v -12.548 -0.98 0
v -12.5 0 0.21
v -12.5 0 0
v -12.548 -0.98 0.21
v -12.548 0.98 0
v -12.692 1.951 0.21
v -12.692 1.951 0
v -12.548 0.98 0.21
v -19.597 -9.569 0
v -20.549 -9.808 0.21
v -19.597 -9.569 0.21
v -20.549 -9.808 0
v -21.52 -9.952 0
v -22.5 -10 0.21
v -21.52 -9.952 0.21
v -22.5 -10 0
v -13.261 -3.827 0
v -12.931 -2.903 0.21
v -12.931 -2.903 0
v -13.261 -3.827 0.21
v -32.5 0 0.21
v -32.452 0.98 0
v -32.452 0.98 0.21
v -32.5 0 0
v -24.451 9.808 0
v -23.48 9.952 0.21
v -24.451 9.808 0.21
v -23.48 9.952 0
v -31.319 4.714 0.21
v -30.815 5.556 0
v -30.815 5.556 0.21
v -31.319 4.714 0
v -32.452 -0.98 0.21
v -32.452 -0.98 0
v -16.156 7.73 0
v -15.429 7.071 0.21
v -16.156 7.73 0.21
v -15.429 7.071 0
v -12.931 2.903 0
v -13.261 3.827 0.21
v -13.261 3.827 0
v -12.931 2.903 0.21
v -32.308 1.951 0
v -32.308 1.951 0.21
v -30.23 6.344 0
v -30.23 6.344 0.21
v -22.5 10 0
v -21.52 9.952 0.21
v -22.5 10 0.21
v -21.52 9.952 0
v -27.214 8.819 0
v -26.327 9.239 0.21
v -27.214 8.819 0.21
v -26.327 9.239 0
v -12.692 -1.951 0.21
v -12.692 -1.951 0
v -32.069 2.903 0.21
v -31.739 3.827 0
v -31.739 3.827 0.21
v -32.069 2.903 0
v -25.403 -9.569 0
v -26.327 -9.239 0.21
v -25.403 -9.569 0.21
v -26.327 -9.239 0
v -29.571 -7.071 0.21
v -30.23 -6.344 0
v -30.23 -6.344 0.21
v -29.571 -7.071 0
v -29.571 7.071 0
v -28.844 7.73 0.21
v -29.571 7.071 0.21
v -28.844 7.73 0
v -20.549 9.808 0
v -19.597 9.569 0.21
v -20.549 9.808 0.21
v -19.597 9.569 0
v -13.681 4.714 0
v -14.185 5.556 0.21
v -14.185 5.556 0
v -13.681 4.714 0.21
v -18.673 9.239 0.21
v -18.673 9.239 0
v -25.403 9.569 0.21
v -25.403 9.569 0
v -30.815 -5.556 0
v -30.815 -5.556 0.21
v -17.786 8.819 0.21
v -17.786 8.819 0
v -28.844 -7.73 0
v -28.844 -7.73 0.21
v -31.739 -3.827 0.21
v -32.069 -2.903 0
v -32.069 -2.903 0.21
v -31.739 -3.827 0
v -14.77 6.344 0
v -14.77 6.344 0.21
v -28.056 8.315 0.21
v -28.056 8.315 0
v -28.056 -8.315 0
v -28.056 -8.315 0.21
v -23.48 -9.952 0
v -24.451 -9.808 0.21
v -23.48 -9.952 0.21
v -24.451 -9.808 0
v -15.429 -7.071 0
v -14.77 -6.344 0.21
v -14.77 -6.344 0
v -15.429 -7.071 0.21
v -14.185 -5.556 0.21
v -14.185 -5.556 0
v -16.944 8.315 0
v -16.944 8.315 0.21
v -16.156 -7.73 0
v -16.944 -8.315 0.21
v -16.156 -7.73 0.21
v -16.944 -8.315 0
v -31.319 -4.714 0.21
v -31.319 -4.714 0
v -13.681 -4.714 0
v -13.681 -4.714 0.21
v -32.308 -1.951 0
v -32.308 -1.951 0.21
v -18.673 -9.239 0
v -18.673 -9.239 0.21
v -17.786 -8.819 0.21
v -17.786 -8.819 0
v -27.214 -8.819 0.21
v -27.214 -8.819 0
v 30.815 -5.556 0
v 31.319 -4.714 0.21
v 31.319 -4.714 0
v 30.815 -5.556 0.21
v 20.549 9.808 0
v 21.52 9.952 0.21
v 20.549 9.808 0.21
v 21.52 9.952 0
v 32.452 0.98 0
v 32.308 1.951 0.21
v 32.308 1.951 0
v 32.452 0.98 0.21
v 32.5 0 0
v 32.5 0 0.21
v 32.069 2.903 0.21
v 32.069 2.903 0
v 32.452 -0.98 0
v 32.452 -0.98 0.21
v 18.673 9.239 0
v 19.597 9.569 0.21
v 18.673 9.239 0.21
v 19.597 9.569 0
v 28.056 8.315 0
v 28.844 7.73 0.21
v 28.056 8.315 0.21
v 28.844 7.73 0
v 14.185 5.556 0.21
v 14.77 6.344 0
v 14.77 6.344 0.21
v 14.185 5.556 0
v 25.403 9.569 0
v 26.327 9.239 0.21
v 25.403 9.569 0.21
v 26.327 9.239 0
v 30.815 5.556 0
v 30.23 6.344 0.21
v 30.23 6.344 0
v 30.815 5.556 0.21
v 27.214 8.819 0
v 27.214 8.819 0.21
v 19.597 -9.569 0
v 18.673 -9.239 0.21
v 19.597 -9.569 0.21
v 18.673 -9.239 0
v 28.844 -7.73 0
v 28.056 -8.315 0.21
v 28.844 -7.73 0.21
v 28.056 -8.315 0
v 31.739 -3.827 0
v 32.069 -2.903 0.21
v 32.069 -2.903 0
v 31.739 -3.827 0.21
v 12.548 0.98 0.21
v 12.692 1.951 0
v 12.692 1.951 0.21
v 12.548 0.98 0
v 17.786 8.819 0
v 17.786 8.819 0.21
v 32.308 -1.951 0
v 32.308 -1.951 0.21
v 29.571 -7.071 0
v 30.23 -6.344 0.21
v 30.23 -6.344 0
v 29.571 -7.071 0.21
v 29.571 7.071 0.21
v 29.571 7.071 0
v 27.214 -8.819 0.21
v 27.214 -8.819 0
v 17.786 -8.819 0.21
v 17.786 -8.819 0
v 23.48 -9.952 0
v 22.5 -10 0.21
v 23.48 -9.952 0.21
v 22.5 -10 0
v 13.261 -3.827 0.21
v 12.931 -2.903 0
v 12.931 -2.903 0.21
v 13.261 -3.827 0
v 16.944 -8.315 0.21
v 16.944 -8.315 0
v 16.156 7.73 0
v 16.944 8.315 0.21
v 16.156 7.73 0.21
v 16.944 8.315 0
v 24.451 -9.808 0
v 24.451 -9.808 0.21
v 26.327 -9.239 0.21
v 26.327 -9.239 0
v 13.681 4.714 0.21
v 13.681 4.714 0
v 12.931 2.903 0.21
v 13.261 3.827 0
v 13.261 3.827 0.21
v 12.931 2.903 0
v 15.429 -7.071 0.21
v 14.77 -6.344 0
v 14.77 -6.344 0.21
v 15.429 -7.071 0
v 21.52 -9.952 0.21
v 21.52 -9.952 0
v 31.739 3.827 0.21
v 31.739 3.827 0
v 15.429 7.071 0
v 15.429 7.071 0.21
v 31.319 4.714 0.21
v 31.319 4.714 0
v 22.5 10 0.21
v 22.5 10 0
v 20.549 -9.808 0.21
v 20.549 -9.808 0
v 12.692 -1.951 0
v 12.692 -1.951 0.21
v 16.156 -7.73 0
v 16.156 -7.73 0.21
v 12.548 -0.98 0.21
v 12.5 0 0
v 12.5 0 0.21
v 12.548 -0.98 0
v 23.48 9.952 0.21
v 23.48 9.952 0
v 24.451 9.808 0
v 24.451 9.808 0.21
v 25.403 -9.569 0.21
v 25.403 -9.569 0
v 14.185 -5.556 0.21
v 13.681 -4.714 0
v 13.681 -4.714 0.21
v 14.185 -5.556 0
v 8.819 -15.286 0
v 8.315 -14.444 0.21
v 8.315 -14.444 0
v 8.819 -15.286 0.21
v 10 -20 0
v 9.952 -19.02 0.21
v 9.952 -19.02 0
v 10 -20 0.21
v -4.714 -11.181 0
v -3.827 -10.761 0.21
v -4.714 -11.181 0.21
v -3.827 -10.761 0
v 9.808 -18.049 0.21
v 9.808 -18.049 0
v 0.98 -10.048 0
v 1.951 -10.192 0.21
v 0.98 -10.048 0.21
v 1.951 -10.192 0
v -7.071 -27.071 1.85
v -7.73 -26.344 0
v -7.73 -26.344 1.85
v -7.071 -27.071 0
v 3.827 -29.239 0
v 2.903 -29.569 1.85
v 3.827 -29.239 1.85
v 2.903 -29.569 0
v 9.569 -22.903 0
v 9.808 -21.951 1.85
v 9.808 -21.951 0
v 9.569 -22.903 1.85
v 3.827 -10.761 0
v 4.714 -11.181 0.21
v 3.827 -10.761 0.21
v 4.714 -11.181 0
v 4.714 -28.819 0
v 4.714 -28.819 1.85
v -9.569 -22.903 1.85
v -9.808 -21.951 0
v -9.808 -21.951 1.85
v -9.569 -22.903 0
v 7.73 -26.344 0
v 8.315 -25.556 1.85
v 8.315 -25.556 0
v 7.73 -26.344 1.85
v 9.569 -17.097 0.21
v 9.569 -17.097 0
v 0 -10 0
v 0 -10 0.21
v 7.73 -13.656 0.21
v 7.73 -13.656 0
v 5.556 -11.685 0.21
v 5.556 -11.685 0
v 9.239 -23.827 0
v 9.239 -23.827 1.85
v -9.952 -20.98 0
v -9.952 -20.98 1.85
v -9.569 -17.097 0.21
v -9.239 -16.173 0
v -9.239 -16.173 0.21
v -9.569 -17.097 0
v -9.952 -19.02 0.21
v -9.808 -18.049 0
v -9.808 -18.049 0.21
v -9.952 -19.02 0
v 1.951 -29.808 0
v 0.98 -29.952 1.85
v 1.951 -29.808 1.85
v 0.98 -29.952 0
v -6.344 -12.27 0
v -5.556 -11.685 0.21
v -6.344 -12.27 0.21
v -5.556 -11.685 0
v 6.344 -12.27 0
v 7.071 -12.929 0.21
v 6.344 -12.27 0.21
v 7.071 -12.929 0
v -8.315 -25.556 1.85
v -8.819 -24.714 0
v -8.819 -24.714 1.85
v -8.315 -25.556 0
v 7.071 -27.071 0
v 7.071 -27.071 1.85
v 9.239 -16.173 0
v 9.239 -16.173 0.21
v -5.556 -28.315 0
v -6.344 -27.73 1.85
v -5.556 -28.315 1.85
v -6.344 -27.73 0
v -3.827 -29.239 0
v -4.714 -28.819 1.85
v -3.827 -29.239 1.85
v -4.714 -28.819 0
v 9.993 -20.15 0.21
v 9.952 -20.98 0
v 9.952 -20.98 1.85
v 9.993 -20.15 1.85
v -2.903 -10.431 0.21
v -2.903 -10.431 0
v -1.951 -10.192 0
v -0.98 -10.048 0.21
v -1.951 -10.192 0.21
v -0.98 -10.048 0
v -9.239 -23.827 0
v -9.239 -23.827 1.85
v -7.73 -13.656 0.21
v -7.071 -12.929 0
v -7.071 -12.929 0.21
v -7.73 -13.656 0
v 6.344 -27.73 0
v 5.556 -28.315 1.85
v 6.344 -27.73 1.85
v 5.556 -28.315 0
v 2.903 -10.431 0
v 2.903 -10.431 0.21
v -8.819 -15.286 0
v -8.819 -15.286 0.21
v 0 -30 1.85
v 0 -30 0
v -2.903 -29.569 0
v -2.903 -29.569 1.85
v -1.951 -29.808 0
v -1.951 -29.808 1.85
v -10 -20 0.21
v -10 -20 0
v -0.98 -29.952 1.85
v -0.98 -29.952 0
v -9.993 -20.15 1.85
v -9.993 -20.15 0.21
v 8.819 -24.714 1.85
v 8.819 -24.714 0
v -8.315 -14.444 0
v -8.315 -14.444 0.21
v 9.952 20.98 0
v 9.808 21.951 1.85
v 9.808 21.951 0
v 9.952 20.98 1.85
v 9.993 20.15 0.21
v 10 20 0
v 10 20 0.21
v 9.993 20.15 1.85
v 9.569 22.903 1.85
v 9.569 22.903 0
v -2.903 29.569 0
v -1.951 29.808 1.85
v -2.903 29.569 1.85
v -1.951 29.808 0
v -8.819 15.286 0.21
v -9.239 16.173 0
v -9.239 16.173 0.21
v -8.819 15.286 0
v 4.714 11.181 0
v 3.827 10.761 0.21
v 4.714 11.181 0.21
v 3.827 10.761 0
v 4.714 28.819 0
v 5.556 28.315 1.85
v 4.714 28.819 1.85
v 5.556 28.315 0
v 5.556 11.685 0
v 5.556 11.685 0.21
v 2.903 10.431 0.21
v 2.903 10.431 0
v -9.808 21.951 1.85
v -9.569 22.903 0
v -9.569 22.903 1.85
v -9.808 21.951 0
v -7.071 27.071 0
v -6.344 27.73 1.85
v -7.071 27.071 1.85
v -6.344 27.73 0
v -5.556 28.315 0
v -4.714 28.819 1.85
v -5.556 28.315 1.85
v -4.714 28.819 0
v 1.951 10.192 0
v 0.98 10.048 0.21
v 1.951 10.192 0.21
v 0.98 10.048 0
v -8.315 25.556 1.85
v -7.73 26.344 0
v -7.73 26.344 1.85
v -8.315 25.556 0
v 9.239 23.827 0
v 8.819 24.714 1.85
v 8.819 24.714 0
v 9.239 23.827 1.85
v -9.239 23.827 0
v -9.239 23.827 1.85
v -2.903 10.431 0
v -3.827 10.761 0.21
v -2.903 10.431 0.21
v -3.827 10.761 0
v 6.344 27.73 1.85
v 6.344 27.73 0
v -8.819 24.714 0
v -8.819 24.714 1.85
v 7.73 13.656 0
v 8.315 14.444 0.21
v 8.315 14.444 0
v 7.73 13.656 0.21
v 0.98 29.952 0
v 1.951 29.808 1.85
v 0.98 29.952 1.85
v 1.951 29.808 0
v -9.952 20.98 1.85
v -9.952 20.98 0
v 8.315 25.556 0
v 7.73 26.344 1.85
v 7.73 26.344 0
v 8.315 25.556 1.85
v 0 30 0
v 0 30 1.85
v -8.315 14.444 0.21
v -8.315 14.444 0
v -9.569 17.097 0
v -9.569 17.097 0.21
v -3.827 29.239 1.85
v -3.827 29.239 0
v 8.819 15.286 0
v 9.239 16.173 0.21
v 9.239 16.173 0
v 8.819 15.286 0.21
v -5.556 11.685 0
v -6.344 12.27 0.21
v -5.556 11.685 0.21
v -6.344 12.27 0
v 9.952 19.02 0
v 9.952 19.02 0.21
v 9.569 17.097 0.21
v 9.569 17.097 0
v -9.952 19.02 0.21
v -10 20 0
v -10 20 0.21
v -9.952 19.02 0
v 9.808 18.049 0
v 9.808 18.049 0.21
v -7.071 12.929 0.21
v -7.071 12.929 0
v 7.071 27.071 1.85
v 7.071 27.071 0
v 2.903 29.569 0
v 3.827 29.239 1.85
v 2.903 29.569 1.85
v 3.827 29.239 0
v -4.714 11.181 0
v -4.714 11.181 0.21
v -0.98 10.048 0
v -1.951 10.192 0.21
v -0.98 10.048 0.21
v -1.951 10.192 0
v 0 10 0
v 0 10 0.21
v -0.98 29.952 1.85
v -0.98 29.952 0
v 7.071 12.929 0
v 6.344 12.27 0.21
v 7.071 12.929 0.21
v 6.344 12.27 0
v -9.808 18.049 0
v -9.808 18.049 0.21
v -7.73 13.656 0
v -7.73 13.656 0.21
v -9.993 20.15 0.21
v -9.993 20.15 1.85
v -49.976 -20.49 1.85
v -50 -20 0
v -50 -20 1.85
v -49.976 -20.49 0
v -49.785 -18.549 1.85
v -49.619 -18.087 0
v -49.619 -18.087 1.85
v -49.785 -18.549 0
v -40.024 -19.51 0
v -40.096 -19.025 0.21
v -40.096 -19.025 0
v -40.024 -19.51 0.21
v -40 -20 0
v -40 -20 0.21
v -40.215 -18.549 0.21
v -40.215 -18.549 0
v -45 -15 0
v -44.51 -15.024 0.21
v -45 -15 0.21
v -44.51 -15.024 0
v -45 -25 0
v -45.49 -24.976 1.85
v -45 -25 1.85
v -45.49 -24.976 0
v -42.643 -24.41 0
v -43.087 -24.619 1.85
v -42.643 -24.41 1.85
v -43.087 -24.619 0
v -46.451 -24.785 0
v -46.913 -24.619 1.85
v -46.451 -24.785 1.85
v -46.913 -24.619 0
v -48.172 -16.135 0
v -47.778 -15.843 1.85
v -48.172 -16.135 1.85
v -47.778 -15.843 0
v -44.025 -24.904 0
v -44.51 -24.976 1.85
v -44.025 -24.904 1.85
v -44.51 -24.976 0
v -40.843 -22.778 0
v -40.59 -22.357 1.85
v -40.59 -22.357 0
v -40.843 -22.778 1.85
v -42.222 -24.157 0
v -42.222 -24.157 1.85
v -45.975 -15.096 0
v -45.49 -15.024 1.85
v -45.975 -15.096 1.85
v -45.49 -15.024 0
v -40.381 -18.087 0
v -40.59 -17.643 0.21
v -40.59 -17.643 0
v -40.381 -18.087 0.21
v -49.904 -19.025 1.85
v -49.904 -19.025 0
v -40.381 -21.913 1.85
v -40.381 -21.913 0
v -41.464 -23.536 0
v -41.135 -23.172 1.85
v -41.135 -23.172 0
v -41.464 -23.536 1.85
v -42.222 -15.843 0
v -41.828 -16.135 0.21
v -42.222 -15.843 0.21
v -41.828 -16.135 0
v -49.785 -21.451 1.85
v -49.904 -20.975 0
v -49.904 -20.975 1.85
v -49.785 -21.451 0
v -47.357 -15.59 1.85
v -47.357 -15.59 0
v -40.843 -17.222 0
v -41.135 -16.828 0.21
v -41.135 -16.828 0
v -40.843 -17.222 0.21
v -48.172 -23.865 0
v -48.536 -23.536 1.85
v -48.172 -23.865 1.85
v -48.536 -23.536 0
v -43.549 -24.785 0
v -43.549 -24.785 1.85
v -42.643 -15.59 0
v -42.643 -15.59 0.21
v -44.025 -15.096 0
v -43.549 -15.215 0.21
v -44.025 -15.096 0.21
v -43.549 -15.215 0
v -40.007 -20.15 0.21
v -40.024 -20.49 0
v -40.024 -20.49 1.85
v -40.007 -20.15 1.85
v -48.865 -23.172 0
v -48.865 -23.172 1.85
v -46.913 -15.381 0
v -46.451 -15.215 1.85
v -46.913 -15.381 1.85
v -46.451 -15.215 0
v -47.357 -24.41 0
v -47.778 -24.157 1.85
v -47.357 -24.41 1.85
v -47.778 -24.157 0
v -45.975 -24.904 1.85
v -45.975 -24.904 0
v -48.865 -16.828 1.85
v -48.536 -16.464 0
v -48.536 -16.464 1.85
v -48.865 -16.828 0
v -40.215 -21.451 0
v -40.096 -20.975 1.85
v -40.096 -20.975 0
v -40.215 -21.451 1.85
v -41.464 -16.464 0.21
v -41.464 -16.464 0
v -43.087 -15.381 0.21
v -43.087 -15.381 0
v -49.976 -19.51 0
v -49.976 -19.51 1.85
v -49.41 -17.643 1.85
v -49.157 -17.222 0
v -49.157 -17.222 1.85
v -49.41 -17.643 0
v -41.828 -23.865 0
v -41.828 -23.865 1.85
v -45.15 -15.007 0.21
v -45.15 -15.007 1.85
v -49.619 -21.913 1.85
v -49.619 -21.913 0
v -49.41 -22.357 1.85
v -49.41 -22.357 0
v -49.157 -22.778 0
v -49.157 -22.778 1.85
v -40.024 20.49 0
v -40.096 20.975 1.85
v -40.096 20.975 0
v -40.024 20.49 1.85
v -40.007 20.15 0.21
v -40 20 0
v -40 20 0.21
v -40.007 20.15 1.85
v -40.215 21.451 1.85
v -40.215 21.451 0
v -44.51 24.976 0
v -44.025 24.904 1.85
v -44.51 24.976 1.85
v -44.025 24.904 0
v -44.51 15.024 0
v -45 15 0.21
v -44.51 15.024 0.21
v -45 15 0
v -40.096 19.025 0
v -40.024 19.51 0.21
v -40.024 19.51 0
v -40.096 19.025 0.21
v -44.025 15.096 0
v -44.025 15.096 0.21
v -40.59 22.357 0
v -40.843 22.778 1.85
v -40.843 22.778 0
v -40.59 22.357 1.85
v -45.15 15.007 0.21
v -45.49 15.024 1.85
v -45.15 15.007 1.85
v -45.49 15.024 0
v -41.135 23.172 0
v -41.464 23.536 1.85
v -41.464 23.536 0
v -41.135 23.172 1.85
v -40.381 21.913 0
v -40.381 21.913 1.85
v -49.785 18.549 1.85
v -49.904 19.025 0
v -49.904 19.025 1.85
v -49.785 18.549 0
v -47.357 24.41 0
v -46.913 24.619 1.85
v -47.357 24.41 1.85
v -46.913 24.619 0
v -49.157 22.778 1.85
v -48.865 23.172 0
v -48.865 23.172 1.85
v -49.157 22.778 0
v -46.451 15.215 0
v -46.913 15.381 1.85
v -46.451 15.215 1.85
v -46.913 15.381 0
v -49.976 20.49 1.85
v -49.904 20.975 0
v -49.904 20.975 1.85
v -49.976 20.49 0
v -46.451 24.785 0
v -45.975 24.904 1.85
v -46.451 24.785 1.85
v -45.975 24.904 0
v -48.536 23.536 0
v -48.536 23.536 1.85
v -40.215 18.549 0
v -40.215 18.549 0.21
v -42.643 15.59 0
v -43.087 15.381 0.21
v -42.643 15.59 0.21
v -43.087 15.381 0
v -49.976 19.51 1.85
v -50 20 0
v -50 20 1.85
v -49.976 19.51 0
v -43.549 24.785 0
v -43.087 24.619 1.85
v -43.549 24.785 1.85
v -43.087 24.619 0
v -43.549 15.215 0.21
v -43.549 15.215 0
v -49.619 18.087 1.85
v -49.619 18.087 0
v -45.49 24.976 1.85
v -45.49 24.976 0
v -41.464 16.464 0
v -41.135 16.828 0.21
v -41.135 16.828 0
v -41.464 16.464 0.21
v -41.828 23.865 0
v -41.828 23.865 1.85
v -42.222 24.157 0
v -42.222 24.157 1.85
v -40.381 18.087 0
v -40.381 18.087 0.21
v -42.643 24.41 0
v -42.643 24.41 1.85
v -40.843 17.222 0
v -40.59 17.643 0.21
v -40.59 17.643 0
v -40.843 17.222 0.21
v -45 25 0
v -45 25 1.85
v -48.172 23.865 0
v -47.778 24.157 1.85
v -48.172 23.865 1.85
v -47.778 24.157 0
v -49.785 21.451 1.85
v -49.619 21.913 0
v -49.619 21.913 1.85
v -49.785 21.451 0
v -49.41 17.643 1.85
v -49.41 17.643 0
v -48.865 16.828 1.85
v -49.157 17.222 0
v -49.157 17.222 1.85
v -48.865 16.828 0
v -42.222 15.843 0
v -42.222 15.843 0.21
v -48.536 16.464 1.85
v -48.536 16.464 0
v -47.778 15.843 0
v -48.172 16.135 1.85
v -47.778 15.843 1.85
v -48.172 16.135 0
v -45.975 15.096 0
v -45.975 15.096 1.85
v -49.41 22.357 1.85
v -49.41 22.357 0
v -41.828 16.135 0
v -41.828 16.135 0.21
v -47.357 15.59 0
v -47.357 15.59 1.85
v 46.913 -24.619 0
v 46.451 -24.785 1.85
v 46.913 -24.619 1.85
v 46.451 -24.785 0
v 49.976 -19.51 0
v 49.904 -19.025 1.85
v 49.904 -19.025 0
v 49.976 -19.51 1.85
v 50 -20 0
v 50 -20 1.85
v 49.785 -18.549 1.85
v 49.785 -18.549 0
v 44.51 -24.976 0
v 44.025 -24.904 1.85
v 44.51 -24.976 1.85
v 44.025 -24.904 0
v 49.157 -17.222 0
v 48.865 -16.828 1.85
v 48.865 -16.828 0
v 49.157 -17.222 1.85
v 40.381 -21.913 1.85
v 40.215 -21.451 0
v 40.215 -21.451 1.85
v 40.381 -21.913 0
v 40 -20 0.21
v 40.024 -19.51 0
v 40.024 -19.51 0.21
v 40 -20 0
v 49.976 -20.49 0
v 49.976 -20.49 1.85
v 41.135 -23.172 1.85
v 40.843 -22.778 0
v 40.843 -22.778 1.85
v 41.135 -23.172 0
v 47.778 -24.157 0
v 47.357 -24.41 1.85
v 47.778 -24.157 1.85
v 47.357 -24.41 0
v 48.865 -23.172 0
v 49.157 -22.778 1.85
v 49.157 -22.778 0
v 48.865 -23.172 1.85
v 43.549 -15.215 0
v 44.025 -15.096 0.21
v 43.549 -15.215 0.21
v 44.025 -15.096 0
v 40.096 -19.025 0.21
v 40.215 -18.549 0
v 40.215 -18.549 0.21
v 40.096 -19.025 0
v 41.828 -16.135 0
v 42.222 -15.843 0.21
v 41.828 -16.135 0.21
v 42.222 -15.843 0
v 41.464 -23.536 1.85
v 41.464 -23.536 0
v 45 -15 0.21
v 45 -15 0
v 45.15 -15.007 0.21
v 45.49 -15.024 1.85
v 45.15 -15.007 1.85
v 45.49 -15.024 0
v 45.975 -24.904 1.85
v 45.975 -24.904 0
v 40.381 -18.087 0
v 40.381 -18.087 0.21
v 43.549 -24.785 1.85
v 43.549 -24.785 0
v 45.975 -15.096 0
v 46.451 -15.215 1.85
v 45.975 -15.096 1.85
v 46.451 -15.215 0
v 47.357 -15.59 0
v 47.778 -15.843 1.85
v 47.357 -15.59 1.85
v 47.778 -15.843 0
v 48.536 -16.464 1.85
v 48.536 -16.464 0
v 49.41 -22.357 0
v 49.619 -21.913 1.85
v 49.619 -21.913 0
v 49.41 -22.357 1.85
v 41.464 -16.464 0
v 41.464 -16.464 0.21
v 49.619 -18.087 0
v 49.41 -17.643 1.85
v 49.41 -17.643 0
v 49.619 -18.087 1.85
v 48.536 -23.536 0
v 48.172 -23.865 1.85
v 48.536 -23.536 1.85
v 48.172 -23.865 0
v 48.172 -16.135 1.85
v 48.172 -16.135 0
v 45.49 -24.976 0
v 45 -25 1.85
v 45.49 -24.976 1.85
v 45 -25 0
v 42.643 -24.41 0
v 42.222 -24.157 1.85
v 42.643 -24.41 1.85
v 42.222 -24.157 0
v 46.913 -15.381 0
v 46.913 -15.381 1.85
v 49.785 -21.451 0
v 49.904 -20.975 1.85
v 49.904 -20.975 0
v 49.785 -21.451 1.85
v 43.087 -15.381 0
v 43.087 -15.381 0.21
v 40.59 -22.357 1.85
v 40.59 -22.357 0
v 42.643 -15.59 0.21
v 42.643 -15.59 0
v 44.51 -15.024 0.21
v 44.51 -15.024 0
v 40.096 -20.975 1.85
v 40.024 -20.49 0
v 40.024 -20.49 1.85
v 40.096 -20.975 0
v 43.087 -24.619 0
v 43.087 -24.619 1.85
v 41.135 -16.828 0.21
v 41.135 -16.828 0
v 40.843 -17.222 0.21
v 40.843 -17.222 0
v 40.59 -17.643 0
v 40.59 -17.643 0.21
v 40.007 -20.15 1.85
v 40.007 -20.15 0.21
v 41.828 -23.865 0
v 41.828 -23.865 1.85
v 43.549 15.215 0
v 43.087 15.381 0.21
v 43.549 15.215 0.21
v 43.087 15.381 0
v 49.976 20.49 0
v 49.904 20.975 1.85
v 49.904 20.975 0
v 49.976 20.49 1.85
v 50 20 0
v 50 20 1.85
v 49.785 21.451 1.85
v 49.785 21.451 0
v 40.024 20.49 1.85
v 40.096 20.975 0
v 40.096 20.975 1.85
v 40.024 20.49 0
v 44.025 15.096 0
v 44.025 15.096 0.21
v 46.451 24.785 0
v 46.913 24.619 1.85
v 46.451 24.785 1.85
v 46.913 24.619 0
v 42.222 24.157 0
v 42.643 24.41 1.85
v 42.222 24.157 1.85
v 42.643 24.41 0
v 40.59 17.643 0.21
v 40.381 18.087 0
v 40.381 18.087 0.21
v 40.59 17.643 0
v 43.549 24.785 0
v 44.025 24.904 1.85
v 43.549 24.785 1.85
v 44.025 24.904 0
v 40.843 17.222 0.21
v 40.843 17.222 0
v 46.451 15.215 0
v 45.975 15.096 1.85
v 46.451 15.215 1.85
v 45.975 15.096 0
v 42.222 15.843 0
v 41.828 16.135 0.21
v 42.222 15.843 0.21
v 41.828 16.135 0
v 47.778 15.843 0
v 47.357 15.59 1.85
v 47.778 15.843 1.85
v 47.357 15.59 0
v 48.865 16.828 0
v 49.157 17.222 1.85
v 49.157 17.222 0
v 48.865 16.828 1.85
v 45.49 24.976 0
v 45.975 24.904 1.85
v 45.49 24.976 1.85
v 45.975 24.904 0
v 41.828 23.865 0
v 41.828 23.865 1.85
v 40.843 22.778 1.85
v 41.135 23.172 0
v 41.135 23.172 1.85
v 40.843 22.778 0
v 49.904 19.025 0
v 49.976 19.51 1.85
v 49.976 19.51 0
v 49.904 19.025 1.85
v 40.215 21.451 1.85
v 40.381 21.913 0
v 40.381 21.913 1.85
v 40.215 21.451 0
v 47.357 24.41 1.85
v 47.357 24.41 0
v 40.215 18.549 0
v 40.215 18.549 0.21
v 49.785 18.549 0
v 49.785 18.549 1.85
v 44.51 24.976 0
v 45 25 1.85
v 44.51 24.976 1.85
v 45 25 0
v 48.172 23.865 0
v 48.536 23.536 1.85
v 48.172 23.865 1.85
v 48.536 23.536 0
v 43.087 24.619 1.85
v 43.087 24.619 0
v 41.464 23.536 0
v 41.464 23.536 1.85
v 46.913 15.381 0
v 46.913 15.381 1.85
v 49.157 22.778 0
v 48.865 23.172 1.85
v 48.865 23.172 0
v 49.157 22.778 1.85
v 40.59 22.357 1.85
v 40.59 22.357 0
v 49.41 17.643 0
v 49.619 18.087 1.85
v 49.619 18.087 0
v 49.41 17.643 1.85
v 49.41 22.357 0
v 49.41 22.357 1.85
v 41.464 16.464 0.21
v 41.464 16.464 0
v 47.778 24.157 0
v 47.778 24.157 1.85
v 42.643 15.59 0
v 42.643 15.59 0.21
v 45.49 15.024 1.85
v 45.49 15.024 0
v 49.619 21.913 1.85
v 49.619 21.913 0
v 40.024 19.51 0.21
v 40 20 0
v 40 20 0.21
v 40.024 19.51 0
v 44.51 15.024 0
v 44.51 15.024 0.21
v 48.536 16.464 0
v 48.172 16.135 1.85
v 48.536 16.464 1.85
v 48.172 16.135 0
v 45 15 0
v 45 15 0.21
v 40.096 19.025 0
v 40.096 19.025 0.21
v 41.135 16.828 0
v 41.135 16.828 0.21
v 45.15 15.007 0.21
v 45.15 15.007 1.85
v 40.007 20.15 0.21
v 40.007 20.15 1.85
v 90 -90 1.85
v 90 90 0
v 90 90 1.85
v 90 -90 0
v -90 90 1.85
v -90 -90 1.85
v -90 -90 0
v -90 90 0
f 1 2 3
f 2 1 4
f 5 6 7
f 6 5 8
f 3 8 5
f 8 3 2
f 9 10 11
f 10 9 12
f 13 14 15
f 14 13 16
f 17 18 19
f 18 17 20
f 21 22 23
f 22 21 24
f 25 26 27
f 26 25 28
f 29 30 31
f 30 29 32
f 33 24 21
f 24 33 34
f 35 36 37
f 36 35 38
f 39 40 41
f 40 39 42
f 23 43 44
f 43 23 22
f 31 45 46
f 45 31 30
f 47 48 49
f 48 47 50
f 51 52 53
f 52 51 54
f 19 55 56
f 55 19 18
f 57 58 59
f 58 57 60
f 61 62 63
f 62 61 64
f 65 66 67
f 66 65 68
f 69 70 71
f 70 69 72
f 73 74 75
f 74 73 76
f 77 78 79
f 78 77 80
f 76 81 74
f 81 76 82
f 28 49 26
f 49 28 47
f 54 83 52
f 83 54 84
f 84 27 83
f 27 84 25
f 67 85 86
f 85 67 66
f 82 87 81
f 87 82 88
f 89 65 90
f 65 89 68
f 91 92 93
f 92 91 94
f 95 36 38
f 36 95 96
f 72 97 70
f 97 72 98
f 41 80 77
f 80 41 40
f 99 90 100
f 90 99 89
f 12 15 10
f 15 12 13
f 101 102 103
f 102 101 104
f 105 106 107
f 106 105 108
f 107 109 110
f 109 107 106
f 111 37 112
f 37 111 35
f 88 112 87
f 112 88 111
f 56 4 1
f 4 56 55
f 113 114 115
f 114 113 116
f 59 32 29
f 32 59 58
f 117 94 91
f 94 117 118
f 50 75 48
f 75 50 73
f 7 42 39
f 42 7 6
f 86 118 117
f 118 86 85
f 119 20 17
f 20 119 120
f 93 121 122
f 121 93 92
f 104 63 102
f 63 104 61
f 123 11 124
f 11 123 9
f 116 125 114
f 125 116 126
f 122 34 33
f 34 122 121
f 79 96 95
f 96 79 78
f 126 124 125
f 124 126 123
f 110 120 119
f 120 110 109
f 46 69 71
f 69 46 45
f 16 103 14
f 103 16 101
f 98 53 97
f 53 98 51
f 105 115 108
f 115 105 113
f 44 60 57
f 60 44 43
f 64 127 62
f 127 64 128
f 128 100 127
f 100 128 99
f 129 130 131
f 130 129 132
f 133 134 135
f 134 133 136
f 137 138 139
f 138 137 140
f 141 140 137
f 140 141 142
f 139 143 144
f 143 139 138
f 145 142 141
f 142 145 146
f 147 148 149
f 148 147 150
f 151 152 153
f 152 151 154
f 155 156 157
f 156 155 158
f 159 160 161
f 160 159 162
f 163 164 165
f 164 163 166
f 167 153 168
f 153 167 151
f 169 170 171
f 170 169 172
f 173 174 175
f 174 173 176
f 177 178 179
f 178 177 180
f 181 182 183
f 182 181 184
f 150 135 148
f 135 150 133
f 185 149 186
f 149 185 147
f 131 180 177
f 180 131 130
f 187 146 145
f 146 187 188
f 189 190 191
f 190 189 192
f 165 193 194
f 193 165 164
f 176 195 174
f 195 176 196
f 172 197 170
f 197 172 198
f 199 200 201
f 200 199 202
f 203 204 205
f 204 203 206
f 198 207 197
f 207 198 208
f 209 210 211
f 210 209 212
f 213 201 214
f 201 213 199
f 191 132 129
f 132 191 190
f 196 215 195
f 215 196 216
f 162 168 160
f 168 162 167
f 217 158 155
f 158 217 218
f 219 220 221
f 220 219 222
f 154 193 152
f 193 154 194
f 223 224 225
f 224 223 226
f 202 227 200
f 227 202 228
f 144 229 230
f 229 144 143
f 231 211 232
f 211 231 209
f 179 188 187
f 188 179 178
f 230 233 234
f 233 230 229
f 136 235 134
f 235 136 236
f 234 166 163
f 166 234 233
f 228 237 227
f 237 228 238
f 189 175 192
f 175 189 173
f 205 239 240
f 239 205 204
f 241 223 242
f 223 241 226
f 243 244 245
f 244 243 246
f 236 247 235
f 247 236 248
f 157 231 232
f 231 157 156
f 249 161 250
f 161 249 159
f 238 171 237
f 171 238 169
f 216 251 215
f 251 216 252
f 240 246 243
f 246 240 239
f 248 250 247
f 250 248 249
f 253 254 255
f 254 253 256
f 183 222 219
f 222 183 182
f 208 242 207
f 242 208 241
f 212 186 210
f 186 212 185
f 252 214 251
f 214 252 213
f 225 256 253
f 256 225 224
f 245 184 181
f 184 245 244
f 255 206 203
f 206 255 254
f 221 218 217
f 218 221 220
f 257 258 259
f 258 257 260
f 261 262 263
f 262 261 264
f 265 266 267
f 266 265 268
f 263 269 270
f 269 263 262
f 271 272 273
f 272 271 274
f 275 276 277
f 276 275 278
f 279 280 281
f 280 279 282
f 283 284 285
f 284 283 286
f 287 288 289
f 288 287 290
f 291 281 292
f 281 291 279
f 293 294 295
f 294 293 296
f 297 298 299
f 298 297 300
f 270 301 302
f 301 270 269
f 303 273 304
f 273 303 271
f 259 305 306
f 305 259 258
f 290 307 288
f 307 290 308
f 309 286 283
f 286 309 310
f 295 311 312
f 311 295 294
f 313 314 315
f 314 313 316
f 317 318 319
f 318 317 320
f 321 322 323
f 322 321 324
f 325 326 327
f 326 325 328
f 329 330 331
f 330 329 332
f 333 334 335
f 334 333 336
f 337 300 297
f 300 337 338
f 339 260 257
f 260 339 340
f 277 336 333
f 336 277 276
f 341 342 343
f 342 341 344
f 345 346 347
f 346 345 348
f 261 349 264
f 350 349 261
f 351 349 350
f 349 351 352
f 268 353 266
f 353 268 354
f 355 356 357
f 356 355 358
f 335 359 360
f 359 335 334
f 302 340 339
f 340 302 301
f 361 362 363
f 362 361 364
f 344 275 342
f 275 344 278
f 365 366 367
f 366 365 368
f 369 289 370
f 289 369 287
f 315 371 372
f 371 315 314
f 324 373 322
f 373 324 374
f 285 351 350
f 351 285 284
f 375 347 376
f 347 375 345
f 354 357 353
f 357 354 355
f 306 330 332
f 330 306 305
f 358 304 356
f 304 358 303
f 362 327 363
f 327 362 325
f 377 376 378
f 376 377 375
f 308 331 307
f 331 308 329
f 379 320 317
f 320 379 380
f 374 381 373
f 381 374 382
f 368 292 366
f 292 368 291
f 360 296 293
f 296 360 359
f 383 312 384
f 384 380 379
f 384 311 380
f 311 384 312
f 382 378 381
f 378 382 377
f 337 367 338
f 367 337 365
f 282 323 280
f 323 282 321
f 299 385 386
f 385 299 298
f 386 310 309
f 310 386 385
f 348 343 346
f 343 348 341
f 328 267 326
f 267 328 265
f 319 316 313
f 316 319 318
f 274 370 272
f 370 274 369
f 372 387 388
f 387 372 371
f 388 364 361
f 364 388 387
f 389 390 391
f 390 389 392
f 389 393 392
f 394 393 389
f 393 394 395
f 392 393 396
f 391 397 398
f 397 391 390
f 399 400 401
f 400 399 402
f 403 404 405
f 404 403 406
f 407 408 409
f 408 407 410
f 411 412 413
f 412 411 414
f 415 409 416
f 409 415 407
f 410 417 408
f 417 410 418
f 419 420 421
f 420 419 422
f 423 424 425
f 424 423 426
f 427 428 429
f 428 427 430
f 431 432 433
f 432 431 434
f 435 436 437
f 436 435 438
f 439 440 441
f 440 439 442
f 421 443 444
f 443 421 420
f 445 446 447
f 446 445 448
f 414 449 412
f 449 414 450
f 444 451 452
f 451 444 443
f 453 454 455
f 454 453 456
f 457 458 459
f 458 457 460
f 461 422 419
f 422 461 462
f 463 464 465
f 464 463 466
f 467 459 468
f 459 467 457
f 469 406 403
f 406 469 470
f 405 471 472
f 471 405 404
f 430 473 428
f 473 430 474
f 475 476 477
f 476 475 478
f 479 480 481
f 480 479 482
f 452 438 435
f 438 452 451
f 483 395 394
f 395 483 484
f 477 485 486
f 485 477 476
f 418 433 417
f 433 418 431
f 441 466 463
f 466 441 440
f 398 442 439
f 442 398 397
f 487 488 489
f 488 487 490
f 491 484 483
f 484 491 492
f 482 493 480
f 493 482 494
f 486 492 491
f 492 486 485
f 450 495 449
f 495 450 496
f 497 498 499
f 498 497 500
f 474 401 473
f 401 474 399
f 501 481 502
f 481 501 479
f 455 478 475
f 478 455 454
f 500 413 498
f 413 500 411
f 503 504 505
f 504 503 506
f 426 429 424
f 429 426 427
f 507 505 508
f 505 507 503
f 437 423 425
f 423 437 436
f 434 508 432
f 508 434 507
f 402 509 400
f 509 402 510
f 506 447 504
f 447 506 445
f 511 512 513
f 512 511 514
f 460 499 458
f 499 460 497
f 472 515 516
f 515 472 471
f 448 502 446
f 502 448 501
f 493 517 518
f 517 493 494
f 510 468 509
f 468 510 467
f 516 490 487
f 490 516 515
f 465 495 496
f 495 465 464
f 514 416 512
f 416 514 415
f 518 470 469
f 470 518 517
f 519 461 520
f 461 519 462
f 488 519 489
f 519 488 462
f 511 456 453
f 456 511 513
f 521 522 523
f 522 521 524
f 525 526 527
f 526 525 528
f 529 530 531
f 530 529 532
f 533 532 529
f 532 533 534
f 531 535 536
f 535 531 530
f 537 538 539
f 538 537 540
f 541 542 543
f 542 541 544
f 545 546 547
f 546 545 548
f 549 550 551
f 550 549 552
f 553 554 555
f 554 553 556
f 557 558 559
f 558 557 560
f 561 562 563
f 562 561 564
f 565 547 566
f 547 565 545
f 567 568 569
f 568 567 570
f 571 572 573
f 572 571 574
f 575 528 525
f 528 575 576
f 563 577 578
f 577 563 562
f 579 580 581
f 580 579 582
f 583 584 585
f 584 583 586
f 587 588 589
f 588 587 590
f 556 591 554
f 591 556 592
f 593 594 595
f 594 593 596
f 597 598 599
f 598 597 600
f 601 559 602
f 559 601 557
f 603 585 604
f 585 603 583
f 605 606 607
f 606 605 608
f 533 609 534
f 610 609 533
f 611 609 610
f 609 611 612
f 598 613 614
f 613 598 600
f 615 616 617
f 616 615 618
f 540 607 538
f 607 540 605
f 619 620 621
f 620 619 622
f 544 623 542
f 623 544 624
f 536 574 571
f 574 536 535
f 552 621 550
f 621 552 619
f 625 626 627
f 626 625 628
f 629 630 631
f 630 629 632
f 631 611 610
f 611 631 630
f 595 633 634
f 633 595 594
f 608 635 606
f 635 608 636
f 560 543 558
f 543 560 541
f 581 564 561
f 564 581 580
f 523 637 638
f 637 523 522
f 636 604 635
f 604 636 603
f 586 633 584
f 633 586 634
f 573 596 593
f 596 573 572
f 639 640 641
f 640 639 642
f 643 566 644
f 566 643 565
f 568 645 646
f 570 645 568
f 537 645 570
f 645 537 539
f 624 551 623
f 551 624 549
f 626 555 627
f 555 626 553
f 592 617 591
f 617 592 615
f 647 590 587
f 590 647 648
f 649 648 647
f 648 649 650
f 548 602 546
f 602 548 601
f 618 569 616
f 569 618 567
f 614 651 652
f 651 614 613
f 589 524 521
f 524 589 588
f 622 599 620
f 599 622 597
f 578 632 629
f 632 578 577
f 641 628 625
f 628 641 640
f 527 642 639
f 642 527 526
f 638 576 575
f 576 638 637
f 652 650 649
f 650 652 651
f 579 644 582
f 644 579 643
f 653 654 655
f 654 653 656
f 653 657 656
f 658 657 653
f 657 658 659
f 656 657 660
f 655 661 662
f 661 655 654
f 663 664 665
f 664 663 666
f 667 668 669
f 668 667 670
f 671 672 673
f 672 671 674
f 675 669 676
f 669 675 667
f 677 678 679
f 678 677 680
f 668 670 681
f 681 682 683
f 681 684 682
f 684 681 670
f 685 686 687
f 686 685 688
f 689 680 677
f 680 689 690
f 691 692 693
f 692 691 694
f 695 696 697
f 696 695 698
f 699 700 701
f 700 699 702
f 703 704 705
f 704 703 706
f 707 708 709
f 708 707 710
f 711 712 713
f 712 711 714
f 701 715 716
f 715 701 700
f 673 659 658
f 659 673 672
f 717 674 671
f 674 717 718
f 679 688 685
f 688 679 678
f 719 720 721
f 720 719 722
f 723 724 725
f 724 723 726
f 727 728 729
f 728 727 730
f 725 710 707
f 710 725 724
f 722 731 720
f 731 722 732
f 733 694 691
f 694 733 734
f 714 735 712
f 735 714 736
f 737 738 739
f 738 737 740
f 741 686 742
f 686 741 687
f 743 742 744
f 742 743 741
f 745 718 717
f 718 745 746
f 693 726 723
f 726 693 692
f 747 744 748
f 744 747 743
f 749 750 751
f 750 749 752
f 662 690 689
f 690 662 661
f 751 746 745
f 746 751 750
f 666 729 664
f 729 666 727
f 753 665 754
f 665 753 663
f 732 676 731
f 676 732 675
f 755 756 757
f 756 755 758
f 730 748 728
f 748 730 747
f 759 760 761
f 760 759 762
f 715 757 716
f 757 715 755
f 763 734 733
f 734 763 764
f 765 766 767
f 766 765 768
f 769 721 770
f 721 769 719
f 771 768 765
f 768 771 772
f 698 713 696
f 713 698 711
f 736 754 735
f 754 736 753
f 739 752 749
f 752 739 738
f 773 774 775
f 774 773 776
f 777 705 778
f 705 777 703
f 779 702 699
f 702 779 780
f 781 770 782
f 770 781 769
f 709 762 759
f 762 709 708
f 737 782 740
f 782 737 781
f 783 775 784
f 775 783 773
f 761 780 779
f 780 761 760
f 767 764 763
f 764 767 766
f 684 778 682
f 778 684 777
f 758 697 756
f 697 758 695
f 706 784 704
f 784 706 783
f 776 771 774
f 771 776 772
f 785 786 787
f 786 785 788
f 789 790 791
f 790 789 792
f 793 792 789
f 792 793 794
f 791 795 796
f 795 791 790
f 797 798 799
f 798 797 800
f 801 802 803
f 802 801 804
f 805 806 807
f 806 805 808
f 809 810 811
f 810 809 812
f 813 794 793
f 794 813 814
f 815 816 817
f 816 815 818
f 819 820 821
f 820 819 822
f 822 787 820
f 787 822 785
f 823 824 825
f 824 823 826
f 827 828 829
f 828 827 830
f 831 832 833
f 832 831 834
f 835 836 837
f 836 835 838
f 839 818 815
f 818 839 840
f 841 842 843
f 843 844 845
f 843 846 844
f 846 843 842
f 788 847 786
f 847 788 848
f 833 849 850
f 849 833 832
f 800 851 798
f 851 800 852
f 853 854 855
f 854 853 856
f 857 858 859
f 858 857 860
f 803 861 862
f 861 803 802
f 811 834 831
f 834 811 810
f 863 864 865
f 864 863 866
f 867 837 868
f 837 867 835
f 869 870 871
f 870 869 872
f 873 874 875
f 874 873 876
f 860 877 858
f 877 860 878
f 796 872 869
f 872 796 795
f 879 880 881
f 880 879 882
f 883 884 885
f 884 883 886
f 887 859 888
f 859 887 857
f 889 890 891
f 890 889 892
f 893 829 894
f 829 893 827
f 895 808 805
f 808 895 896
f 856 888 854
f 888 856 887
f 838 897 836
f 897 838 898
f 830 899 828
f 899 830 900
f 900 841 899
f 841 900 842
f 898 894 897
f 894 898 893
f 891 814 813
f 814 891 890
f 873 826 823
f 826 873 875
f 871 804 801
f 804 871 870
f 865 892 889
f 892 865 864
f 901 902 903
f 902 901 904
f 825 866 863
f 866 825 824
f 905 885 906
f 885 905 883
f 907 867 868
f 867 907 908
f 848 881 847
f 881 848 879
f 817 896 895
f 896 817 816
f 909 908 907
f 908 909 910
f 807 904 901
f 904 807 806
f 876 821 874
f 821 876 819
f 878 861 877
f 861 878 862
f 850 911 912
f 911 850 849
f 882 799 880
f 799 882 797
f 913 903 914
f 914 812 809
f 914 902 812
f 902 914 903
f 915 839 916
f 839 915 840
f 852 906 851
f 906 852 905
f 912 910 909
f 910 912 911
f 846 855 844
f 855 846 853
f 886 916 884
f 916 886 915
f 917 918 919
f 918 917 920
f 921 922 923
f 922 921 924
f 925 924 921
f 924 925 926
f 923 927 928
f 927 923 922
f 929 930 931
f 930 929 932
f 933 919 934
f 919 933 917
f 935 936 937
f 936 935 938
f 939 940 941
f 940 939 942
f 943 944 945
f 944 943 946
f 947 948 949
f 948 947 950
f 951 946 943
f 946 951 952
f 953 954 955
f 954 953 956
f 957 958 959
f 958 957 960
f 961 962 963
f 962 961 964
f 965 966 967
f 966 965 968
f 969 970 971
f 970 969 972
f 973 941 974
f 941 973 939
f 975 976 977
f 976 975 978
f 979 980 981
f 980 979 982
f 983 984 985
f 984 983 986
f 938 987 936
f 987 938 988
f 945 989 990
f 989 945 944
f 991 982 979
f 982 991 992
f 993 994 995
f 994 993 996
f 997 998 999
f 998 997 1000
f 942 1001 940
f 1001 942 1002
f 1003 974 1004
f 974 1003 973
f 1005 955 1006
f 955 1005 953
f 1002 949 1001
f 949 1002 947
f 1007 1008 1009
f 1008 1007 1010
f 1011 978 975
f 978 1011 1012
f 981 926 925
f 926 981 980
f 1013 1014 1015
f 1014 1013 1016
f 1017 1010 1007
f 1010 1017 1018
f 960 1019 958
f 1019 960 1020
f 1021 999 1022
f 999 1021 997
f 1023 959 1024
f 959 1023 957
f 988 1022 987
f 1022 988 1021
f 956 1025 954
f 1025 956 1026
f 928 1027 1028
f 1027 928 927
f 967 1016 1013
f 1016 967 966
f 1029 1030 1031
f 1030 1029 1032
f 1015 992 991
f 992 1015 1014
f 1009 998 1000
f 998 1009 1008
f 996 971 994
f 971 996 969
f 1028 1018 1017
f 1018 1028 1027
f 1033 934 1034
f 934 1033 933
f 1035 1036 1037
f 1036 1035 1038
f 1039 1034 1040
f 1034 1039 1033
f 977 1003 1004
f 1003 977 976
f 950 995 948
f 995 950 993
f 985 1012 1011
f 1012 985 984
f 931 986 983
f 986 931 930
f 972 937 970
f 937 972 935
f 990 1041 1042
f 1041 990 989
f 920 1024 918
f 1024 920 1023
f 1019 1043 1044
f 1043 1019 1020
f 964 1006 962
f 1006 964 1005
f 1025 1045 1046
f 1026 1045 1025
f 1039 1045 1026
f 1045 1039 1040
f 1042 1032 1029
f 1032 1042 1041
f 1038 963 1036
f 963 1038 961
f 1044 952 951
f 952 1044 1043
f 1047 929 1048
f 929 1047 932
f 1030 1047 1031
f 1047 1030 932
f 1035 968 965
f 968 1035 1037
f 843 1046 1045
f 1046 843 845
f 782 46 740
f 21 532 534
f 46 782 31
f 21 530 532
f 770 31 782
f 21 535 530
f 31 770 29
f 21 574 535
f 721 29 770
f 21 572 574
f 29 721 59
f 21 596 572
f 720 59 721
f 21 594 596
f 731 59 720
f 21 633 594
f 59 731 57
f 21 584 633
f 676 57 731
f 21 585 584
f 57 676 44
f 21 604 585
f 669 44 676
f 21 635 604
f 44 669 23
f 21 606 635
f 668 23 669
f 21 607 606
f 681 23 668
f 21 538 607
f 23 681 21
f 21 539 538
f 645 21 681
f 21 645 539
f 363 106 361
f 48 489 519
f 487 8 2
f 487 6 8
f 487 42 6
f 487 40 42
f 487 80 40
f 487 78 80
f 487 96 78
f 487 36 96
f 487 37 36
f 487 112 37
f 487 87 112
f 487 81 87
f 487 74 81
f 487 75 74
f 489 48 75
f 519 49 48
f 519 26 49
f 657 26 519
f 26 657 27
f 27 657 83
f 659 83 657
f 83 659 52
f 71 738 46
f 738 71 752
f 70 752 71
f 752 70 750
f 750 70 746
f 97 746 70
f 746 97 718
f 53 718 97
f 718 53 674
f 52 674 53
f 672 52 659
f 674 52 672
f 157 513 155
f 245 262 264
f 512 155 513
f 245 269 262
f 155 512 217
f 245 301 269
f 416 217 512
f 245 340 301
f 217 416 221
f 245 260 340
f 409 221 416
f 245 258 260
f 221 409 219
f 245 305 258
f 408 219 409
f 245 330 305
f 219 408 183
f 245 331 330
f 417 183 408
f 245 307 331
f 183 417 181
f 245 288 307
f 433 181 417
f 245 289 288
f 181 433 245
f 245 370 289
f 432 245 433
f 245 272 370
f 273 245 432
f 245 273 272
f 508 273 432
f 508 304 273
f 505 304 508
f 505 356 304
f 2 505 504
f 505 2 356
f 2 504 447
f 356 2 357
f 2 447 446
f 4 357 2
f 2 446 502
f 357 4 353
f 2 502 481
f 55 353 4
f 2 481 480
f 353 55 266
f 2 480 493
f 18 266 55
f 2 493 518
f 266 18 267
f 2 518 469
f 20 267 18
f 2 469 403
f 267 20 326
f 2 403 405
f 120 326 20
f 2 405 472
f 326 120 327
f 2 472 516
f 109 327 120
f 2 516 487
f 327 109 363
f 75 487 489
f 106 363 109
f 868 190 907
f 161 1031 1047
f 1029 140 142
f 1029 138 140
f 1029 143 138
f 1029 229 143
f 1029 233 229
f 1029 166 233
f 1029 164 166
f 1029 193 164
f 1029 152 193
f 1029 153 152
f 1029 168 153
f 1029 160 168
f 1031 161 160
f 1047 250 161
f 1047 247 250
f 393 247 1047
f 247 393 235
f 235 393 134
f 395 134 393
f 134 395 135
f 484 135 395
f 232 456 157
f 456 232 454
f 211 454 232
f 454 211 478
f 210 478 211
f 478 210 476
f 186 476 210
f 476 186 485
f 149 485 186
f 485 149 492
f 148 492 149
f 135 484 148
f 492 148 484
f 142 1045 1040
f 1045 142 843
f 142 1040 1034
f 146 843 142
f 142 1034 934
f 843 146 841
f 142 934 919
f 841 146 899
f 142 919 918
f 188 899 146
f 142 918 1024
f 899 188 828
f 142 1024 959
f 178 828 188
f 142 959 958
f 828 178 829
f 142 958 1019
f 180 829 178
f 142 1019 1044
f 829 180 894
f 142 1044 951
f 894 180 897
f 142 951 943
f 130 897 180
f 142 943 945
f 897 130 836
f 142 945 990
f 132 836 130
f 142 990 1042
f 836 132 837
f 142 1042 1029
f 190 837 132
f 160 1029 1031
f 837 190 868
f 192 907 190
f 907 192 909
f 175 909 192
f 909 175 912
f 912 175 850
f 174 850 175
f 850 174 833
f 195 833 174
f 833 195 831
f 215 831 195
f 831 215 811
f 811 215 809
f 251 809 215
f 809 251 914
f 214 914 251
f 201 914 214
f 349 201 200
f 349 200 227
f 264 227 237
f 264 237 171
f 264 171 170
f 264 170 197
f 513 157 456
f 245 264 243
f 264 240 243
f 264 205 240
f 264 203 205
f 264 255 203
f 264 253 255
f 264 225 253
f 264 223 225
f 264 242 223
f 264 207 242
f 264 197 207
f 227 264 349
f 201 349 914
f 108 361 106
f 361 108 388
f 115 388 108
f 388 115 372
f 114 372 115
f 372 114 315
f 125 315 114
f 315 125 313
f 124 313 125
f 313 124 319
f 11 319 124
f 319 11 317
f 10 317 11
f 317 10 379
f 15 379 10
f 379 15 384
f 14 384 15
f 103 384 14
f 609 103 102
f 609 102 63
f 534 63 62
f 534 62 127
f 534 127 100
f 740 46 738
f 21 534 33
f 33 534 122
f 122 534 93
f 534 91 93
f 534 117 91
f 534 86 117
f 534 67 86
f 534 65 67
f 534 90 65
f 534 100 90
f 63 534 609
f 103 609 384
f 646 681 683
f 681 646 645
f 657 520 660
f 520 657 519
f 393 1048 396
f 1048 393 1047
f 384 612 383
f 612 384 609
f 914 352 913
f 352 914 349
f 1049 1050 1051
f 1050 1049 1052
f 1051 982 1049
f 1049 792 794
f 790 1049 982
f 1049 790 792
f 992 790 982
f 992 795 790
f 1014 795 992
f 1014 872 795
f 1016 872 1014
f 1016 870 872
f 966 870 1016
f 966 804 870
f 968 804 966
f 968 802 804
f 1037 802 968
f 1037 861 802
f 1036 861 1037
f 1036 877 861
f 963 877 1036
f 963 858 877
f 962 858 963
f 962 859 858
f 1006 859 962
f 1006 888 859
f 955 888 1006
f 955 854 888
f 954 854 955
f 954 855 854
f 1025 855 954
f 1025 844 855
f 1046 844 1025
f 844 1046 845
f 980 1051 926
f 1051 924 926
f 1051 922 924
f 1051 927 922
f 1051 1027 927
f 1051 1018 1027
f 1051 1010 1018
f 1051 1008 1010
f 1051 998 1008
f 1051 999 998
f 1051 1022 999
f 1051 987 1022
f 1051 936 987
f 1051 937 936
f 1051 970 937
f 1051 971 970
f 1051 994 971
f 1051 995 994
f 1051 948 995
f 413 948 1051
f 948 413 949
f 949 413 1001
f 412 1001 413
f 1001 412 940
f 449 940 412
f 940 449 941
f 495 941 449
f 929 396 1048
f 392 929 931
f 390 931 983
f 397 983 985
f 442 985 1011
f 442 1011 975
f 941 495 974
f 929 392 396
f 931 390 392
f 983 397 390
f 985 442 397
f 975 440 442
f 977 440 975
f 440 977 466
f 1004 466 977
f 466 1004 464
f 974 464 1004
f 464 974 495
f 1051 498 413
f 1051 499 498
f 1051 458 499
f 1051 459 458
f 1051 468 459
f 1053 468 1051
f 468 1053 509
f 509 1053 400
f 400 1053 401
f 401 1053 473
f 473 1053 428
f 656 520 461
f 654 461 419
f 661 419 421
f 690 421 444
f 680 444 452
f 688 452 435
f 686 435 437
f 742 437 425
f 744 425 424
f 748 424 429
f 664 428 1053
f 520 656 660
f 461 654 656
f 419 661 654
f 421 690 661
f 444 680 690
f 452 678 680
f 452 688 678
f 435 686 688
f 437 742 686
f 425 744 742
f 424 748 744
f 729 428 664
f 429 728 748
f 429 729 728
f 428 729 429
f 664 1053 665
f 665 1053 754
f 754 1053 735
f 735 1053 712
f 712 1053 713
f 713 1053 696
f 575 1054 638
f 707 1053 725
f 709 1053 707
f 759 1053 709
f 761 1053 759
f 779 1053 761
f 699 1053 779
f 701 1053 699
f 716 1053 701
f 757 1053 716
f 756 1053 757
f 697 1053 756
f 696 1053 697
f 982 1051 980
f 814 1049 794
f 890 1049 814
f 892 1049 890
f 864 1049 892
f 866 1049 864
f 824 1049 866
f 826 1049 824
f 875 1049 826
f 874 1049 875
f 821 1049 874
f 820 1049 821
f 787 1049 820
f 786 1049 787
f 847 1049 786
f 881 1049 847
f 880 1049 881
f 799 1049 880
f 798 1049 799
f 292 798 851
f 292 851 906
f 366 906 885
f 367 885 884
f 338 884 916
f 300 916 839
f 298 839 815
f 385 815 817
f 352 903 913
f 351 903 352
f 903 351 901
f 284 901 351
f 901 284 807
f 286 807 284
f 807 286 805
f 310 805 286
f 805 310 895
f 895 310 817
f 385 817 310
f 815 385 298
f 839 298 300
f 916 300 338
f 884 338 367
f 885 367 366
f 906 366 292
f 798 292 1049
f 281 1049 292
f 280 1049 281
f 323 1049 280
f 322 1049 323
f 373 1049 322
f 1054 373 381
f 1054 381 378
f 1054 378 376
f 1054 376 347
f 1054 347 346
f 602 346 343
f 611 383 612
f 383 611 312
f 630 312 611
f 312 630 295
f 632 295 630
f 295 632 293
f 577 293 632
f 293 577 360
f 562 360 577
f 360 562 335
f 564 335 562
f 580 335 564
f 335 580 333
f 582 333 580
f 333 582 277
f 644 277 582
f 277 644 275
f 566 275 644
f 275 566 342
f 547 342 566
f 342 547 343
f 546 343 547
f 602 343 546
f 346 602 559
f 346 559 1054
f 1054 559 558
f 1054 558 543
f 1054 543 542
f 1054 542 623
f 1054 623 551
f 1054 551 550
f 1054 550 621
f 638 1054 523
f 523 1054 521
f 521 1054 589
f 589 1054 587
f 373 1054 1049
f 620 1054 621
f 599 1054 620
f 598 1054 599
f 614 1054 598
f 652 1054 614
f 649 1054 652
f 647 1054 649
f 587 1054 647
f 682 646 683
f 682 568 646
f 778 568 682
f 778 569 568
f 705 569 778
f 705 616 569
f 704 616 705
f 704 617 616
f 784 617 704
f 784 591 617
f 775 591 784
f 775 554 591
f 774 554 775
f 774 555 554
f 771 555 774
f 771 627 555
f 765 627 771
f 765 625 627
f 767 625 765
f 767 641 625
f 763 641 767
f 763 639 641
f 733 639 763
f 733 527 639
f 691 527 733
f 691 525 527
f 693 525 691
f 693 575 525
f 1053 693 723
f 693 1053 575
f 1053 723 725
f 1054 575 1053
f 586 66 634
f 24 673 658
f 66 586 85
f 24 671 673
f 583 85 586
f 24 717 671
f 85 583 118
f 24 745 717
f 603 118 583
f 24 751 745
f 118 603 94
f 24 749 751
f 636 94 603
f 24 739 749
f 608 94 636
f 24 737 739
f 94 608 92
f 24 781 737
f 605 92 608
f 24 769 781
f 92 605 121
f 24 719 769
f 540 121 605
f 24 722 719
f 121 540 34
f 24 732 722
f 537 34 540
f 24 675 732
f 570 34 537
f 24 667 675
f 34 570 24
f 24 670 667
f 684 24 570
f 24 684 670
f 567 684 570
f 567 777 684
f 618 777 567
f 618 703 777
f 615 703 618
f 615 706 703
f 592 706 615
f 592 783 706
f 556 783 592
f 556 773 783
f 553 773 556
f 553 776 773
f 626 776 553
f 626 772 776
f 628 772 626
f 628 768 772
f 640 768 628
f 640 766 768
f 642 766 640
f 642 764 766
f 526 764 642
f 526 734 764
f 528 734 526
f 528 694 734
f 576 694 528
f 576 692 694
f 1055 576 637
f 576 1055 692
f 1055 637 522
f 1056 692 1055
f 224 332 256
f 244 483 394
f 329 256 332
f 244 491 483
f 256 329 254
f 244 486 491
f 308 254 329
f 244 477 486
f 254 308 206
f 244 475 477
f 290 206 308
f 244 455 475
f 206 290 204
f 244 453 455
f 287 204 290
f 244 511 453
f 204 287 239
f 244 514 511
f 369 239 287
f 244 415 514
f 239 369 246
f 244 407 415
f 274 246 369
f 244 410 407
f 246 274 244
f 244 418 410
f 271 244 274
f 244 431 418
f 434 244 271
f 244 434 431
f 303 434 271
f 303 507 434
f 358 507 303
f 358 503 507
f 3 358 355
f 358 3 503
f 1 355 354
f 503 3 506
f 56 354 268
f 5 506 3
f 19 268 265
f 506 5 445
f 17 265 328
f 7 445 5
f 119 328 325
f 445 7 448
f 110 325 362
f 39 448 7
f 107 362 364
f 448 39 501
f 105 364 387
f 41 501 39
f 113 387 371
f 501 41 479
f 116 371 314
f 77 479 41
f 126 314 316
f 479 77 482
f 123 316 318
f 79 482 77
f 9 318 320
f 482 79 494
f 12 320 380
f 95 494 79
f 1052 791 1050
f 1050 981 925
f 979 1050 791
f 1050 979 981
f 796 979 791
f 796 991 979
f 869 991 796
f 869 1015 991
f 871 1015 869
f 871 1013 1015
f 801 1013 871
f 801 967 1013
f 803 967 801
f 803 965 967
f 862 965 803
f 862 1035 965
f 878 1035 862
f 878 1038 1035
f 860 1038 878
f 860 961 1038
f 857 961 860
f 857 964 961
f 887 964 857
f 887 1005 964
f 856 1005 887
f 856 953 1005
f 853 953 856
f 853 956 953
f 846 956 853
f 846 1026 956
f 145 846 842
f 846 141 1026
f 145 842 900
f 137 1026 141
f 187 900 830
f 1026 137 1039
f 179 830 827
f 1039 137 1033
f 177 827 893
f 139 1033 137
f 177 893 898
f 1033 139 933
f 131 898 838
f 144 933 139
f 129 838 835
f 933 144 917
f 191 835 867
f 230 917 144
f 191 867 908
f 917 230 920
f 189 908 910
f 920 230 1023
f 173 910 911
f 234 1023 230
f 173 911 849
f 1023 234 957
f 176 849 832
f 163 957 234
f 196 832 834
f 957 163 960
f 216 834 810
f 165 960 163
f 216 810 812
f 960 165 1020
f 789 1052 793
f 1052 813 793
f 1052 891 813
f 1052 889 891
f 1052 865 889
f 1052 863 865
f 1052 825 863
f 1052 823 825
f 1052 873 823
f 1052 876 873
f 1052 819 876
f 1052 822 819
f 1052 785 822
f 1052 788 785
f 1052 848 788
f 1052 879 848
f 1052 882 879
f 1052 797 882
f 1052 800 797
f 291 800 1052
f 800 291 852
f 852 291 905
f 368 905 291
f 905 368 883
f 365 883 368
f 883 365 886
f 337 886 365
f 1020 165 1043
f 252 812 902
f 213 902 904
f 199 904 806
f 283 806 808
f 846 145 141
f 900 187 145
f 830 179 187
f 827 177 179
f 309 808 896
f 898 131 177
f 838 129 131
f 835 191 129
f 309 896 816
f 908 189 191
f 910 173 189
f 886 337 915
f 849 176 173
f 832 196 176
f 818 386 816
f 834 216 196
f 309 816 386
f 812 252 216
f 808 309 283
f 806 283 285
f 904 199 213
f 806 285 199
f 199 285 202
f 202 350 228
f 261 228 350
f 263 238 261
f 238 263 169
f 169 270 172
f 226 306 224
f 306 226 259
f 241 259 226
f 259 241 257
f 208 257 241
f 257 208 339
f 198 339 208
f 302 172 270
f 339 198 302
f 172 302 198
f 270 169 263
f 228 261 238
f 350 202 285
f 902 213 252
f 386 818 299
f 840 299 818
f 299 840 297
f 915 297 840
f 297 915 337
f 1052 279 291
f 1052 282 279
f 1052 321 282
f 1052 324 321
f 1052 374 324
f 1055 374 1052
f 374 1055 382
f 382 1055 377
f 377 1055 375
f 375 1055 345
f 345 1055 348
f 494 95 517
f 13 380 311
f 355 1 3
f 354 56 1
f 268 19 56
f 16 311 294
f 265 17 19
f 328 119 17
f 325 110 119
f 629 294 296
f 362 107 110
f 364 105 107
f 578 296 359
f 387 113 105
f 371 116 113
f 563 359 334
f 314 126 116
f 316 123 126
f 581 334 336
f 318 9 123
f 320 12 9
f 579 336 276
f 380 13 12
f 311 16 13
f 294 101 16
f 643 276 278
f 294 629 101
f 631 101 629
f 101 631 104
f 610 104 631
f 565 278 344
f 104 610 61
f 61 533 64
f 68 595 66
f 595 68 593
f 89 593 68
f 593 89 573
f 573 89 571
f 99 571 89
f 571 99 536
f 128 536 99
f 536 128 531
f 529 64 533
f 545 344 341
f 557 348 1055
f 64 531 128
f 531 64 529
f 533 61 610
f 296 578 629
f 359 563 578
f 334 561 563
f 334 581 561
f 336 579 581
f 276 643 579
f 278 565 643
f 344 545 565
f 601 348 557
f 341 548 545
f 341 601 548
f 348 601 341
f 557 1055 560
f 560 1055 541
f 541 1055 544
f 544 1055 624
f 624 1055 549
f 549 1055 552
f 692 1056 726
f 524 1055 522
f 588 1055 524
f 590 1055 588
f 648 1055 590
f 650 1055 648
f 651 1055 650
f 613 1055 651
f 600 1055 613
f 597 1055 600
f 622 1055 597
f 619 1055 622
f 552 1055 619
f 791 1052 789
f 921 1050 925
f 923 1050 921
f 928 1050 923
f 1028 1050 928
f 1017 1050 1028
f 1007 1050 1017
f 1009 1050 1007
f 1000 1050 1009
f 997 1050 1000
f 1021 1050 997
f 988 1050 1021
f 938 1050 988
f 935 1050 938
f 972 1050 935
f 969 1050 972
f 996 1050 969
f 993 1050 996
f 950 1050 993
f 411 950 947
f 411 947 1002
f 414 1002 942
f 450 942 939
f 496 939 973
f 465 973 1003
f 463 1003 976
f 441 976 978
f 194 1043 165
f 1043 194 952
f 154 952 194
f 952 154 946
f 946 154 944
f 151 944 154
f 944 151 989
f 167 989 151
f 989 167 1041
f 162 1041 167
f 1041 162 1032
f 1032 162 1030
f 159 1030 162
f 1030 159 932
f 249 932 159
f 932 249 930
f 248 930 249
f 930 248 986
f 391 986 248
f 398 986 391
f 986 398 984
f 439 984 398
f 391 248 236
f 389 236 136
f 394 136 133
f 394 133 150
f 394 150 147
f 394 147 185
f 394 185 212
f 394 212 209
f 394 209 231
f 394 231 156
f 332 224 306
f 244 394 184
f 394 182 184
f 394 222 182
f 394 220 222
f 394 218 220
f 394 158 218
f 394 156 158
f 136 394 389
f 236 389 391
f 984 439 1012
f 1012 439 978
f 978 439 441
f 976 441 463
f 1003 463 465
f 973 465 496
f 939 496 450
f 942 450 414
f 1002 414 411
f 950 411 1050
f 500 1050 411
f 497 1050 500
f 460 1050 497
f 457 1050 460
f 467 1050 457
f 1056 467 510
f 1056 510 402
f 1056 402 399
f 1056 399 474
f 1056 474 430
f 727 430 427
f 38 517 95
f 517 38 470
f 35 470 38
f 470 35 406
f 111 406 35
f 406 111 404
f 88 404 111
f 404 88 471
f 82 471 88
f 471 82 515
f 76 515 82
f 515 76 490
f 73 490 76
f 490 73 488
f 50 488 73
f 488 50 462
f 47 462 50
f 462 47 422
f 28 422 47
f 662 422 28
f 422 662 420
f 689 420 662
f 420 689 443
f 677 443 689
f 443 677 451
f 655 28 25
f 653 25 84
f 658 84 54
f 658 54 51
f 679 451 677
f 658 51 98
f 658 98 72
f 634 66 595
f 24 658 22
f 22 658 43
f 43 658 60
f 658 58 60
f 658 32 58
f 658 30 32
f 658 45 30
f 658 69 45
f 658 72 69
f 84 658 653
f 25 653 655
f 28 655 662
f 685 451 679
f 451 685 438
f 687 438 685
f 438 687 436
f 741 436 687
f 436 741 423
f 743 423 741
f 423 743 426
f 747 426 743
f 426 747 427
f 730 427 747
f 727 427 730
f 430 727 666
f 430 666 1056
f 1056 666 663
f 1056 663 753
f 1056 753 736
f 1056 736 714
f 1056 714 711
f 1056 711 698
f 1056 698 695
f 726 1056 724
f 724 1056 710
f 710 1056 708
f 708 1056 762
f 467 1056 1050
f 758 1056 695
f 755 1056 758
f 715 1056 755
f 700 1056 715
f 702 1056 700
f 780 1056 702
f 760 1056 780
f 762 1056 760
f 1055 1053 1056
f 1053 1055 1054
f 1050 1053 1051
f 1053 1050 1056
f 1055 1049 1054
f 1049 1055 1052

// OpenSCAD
pcb = [90.0, 40.0, 1.65];
gap = 0.3;

base = [180, 180, 0.2];

module corners(dim, center=true) {
    coords = [[0,0], [0, dim.y], [dim.x, 0], dim];
    for (vector=coords)
        translate(vector - (center?([dim[0], dim[1]]/2):0))
            children();
}

module jig() {
    difference() {
        union() {
            translate([0, 0, (base.z+pcb.z)/2])
                cube(base + [0,0, pcb.z], center=true);
        }
        union() {
            translate([0, 0, base.z+pcb.z/2+0.01])
                cube(pcb+[1,1,0]*gap, center=true);
            
            for(i=[0:1])
                translate([(i*2-1)*pcb.x/4,0,-1])
                    cylinder(d=min([pcb.x,pcb.y])/2, h=pcb.z+base.z+2);
            
            for(i=[0:1])
                translate([0,(2*i-1)*pcb.y/2,-1])
                    cylinder(d=min([pcb.x,pcb.y])/2, h=pcb.z+base.z+2);
            
            translate([0,0,-1])
                corners(pcb, center=true)
                    cylinder(d=min([pcb.x,pcb.y])/4,h=pcb.z+base.z+2);
                
        }
    }
}

jig();

module shim() {
    difference() {
        cube([41, 24, 0.8], center=true);
        translate([-27,0,-1])
            rotate([0,0,45])
                cube([100,100,100]);
    }
}

$fn = 64;
